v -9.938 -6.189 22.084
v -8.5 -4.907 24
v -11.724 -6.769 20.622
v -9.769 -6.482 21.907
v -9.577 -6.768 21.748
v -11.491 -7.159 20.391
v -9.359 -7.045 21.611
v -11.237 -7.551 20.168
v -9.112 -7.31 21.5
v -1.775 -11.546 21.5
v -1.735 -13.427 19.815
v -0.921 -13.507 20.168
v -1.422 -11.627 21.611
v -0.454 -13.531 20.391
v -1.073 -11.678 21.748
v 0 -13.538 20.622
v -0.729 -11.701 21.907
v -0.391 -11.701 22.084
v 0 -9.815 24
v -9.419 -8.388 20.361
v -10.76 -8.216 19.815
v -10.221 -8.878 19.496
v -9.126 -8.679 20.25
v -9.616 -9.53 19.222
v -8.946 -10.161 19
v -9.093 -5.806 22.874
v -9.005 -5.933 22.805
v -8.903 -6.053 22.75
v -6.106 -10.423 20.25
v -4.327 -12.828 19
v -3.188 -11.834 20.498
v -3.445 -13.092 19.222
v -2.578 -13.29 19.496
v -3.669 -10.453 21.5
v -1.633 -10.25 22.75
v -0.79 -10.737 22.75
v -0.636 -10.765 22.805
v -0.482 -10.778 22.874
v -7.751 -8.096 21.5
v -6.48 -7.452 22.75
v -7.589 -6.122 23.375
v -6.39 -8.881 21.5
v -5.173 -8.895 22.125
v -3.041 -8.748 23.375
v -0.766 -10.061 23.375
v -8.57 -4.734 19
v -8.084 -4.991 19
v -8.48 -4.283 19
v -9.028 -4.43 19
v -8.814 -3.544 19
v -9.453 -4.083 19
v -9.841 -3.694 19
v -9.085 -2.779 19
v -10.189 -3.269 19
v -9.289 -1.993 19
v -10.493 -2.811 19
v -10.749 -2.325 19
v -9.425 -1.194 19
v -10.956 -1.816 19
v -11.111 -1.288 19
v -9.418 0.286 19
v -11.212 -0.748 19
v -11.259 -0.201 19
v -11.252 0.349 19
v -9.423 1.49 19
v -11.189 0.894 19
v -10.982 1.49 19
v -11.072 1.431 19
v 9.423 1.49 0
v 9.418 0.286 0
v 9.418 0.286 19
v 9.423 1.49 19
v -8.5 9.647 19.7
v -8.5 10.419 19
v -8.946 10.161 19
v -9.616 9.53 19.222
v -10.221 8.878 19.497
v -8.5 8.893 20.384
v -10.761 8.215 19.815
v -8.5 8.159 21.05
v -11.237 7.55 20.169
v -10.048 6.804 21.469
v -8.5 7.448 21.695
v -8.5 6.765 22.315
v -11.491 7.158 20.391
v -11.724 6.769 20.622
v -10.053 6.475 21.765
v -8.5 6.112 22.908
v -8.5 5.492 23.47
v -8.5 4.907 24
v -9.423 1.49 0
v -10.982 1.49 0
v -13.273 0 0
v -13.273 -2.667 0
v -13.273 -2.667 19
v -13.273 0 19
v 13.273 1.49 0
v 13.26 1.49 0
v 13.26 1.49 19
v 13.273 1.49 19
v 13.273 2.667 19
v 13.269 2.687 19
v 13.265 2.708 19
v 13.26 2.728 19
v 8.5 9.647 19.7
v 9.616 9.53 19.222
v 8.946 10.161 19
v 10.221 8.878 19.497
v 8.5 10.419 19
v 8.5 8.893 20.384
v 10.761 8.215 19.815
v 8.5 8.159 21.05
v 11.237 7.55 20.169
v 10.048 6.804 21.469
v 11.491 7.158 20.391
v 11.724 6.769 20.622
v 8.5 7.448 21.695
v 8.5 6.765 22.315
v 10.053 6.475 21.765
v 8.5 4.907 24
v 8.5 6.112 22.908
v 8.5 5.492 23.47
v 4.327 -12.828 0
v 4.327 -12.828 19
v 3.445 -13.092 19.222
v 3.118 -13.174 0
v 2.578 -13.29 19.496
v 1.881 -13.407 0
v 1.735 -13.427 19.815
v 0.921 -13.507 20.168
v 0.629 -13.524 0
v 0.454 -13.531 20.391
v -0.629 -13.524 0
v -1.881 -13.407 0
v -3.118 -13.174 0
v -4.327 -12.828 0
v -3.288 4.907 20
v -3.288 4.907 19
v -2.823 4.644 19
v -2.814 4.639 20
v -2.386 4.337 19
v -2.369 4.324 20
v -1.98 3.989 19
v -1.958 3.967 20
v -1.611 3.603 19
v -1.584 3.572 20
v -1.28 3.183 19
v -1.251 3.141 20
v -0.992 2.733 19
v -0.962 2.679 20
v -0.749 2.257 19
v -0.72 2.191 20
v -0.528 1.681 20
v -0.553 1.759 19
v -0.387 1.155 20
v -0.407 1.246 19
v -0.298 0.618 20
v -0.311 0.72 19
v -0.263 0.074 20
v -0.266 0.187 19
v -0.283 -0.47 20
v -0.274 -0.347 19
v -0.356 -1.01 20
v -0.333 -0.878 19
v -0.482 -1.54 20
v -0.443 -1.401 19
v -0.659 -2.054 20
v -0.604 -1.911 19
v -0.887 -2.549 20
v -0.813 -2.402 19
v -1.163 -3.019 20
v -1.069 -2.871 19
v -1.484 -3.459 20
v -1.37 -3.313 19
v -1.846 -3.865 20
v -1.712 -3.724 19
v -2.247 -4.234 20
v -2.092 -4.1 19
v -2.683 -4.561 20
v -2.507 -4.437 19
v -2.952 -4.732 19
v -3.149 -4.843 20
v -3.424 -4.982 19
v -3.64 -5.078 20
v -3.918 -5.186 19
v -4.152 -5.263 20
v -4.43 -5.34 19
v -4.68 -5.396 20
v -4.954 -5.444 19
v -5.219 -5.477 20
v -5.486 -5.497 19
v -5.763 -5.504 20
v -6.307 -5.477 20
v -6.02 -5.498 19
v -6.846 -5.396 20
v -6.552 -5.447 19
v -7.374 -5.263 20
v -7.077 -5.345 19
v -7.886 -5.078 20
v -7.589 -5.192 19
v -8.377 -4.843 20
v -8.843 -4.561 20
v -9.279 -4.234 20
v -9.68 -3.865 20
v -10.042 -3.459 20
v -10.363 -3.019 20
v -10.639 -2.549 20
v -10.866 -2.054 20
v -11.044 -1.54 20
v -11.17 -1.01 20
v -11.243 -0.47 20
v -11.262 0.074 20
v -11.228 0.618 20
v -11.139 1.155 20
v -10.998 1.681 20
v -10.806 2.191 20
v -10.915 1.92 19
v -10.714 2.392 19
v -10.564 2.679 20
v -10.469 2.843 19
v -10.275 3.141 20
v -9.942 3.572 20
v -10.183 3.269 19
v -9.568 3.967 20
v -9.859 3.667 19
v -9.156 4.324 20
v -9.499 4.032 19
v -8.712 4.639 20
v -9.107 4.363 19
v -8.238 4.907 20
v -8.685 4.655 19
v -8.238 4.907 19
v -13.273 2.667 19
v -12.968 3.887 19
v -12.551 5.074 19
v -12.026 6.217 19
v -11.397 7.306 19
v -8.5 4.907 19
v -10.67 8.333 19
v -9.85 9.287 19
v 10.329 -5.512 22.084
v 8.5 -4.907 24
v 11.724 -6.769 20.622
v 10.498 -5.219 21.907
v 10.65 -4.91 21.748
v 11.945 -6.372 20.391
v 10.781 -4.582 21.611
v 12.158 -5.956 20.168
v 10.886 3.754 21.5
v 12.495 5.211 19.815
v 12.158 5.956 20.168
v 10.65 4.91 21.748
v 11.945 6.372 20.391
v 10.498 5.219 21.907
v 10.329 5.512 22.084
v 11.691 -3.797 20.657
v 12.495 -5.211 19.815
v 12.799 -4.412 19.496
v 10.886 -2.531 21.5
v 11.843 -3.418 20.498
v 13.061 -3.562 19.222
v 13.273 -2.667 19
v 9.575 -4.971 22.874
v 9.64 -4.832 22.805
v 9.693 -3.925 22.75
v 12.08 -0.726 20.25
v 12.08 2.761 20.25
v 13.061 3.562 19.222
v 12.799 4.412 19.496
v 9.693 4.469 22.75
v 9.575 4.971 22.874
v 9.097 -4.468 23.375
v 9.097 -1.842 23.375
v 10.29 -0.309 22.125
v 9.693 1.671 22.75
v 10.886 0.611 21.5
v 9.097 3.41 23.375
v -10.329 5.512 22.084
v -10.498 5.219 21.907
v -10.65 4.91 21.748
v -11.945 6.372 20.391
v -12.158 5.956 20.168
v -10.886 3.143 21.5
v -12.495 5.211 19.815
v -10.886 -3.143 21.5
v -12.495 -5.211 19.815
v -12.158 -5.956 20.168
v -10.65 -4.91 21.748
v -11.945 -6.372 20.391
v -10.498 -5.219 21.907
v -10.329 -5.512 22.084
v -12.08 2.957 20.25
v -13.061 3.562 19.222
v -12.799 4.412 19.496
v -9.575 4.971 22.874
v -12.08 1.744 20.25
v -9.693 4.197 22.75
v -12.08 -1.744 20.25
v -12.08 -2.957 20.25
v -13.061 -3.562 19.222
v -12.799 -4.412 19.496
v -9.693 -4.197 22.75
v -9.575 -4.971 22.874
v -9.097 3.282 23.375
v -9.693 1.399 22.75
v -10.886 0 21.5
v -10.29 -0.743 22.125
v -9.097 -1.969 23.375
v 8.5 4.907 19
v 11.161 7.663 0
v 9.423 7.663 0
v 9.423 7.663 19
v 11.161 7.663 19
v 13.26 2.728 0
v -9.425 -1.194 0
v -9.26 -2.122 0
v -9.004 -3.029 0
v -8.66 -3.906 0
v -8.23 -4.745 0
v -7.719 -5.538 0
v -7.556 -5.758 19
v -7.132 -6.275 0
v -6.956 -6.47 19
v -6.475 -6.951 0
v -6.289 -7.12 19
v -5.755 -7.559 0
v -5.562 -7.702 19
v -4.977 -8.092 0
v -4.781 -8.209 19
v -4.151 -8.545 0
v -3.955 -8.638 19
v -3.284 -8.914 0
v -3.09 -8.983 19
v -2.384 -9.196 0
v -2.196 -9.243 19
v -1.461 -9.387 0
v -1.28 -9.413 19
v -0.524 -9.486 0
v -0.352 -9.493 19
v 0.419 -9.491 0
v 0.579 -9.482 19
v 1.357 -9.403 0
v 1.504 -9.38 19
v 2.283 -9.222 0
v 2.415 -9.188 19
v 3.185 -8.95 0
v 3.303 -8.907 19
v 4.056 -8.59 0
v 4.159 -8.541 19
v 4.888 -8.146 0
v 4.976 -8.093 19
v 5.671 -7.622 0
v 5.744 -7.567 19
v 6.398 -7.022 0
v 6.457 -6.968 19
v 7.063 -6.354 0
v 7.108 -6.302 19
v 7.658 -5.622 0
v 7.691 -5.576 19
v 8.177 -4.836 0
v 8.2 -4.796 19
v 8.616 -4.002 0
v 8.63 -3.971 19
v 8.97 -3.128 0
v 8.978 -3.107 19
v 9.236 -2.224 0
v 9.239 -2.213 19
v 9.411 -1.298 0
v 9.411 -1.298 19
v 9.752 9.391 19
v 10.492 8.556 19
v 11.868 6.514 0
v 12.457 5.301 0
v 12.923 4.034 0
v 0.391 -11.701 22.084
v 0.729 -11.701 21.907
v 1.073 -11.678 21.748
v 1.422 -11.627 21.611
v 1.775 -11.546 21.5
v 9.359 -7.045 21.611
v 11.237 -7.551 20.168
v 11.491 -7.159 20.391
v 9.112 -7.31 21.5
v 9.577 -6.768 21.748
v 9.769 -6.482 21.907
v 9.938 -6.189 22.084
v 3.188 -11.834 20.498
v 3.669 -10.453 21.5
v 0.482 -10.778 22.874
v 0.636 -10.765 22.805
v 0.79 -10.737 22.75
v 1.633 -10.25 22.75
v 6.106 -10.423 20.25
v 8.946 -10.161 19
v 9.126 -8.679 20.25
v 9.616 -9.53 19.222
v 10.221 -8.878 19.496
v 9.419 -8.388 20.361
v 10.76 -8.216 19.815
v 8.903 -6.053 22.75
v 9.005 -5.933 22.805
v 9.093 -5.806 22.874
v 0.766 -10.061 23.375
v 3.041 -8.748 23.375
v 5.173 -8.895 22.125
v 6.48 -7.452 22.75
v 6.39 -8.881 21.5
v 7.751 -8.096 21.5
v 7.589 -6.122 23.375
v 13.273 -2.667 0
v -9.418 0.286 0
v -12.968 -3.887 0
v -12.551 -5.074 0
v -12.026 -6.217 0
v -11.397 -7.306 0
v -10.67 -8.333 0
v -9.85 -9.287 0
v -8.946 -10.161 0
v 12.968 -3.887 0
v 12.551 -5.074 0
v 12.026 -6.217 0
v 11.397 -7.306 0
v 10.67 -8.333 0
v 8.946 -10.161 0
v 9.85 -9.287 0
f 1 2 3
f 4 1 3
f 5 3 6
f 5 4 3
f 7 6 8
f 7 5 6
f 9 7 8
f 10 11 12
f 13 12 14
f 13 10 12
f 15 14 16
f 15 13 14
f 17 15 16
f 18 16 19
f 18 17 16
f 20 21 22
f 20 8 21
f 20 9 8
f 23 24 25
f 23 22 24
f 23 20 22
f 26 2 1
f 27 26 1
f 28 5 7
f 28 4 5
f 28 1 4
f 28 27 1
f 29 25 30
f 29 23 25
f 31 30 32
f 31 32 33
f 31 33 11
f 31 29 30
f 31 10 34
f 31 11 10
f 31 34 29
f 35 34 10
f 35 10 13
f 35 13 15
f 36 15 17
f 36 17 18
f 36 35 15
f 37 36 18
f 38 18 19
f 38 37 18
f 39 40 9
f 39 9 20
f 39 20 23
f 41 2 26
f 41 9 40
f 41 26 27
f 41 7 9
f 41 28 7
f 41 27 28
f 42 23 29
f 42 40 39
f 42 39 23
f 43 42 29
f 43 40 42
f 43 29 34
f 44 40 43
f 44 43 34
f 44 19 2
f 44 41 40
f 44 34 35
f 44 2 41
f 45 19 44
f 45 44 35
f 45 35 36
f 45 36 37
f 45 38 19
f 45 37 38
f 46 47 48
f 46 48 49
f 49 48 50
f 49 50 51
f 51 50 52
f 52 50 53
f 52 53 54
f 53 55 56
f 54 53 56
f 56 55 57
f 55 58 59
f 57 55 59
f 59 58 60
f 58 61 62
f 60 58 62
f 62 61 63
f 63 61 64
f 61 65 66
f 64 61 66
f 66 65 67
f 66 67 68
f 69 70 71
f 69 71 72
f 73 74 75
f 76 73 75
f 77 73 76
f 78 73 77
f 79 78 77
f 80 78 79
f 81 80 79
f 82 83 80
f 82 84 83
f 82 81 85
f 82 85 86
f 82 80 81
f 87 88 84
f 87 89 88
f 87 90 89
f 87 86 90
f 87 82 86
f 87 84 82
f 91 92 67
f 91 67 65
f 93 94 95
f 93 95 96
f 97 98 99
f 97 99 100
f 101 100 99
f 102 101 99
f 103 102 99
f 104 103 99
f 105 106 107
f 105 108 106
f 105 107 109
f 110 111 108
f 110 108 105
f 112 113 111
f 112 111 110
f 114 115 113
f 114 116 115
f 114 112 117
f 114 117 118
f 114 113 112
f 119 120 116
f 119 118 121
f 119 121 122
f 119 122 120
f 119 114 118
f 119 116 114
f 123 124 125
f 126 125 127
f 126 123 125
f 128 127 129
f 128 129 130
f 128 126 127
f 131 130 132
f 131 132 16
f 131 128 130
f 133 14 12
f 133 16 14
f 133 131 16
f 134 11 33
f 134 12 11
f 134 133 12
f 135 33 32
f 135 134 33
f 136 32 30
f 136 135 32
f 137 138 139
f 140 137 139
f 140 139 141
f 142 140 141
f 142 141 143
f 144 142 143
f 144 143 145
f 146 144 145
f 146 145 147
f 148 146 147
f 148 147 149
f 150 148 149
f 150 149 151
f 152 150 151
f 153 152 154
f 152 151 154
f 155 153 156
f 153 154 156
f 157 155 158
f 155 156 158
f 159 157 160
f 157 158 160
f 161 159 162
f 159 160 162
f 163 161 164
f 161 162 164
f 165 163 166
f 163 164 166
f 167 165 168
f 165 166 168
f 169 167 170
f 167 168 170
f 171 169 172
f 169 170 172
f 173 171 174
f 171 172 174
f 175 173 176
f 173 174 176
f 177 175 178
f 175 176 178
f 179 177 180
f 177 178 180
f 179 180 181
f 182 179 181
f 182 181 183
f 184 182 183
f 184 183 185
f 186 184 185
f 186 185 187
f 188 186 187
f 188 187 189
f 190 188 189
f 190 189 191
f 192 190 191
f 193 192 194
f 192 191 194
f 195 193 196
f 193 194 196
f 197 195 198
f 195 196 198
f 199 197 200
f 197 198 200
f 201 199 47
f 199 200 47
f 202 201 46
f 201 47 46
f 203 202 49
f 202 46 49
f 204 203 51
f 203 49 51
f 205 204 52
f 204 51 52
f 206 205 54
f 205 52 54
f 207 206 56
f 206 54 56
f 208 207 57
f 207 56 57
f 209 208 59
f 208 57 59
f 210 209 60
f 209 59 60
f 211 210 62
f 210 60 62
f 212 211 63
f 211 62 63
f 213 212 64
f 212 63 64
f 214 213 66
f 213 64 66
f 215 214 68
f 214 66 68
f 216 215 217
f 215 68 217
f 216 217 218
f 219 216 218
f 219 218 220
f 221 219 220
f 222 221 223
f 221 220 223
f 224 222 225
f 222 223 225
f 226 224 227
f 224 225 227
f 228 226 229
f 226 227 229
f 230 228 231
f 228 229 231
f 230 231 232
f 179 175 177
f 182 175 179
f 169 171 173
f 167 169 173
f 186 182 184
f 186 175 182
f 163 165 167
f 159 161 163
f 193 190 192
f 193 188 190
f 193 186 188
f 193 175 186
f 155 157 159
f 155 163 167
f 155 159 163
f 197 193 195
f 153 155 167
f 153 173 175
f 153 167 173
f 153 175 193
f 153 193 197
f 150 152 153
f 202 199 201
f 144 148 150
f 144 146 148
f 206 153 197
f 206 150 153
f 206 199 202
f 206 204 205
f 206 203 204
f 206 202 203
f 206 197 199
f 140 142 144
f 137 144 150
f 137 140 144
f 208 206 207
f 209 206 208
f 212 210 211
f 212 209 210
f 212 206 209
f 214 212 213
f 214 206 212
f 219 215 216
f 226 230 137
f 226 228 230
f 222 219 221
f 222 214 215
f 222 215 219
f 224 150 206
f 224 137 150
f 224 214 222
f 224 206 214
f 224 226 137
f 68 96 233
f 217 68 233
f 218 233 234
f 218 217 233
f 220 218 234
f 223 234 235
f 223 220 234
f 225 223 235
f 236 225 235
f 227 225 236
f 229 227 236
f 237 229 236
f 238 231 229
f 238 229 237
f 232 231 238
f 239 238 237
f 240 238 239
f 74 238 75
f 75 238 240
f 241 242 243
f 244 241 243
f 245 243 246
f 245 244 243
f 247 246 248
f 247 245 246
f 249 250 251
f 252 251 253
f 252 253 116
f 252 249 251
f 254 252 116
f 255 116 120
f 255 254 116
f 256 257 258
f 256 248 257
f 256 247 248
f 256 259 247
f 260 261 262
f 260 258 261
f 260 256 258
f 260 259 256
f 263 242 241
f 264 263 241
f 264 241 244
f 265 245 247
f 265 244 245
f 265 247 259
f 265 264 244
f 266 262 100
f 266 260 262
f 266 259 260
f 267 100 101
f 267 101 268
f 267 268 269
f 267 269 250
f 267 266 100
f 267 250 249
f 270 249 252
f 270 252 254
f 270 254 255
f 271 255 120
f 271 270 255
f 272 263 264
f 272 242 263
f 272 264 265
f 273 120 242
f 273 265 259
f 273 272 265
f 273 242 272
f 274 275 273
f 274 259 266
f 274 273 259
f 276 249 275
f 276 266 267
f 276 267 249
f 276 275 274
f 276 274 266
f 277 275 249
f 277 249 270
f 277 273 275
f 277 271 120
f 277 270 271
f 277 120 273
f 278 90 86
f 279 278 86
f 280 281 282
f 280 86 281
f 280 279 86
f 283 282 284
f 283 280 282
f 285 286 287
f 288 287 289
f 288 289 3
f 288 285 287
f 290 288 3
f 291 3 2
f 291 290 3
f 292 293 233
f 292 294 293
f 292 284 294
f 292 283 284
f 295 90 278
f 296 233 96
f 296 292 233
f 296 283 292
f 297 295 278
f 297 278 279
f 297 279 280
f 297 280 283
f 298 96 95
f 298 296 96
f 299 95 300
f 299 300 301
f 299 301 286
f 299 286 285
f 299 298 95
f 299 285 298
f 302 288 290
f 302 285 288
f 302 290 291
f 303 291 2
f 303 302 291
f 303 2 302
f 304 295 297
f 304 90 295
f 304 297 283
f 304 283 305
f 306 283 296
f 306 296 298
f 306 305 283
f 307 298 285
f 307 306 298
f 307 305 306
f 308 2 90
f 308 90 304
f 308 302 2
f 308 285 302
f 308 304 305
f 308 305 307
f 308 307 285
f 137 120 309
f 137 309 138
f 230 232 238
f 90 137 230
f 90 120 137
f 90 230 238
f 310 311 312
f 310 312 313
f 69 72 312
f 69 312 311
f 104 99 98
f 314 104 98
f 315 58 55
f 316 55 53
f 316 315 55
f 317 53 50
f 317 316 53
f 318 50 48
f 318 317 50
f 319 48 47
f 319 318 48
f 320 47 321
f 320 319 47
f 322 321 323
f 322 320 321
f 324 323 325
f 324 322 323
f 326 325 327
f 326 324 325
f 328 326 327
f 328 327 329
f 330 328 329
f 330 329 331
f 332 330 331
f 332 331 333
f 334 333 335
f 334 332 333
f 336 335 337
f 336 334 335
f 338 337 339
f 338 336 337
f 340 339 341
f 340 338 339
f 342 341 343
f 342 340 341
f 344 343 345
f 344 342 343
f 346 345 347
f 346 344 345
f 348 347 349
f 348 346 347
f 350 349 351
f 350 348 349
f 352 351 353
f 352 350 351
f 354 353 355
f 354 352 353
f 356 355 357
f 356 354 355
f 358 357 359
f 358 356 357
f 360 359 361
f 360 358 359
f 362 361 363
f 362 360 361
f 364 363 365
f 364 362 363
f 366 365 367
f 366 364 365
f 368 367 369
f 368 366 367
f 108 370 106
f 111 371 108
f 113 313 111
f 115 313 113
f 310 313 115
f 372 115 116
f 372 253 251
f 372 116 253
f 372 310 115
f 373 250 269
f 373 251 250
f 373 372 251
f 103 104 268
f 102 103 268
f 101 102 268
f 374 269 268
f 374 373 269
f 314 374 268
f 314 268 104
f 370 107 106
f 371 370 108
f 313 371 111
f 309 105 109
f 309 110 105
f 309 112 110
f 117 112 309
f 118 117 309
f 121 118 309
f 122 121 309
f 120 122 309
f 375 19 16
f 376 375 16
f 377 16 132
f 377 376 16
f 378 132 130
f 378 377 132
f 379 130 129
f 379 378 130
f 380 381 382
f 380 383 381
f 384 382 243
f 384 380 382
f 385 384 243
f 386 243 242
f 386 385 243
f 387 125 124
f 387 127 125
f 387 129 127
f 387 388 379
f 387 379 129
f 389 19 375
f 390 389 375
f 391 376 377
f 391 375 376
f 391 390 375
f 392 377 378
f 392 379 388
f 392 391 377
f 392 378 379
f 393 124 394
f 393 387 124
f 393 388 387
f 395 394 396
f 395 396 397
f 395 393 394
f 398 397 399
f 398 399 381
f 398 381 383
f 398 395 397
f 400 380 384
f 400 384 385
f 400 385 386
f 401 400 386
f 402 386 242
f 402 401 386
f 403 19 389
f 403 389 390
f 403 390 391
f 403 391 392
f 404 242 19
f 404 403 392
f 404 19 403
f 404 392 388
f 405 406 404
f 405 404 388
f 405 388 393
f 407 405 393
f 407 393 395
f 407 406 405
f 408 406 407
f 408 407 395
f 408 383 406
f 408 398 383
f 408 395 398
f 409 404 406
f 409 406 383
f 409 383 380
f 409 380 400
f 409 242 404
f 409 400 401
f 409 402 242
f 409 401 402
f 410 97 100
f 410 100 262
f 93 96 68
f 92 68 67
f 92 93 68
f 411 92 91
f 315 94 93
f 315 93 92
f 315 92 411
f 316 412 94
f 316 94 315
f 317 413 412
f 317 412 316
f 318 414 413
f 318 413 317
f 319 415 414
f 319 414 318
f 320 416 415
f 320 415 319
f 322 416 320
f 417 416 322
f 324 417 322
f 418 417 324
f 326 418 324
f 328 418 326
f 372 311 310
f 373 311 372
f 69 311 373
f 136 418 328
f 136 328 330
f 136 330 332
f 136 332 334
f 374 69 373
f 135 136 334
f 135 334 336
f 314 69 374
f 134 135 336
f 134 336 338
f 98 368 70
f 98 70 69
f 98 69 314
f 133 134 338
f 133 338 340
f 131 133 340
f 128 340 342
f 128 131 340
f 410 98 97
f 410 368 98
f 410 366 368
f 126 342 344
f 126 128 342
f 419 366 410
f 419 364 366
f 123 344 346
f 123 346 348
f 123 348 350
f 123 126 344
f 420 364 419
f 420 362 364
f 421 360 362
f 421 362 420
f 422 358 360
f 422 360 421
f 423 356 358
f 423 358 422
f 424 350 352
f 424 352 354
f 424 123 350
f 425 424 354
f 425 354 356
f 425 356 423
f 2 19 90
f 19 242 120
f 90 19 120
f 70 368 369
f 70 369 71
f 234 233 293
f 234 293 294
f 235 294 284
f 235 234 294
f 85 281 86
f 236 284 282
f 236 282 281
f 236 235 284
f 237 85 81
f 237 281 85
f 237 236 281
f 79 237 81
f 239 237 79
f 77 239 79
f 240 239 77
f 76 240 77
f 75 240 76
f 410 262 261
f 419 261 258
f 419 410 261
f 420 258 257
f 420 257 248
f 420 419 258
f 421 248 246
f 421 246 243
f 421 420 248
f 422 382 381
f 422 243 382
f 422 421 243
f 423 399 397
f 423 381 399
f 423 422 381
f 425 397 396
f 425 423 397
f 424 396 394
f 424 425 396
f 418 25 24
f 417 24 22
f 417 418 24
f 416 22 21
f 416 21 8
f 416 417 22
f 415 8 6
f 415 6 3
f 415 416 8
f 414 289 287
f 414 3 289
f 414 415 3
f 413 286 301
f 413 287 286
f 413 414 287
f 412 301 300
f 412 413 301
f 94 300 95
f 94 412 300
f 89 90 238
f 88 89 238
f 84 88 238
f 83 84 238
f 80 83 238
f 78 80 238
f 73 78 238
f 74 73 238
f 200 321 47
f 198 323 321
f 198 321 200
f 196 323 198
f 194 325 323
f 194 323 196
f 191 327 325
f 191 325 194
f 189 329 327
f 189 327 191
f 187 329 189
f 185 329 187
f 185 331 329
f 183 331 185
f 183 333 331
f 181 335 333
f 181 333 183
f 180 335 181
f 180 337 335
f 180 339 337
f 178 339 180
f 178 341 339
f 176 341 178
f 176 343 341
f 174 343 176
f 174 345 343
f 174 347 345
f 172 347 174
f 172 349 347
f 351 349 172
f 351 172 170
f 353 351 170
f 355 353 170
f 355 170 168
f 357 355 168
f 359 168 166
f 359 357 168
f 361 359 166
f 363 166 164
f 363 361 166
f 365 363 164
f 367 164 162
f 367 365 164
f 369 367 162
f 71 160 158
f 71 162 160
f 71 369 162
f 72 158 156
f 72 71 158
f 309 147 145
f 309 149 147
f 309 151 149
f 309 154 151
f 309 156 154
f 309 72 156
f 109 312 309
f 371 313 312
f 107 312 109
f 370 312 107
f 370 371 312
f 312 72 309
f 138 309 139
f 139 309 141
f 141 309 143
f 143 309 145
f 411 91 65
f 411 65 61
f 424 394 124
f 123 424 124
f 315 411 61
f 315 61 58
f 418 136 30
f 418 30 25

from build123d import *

# Parameters (mm, degrees)
BOSS_EXTRUDE1_DEPTH = 19
CUT_EXTRUDE1_DEPTH  = 5
SKETCH5_R           = 5.5
CUT_EXTRUDE2_DEPTH  = 1
SKETCH6_W           = 3.836976741
SKETCH6_H           = 19
BOSS_EXTRUDE2_DEPTH = 6.17281
CUT_EXTRUDE3_DEPTH  = 19
SKETCH8_R           = 15.326273961
SKETCH8_R_2         = 13.53815969
CUT_EXTRUDE4_DEPTH  = 20
CUT_EXTRUDE5_START  = -20
SKETCH9_R           = 15.315451293
SKETCH9_R_2         = 13.53815969
CUT_EXTRUDE5_DEPTH  = 20


with BuildPart() as part:
    # Sketch1 → Boss-Extrude1 (new body)
    with BuildSketch(Plane.XY):
        with BuildLine():
            Line((9.418070486, 0.286487124), (9.423467442, 1.490329505))
            Line((9.423467442, 1.490329505), (13.272942596, 1.490329505))
            Line((13.272942596, 1.490329505), (13.272942596, -7.663136981))
            Line((13.272942596, -7.663136981), (0, -15.326273961))
            Line((0, -15.326273961), (-13.272942596, -7.663136981))
            Line((-13.272942596, -7.663136981), (-13.272942596, 0))
            Line((-13.272942596, 0), (-10.981676699, 1.490329505))
            Line((-10.981676699, 1.490329505), (-9.423467442, 1.490329505))
            Line((-9.423467442, 1.490329505), (-9.418070486, 0.286487124))
            Line((-9.418070486, 0.286487124), (-9.42470631, -1.19369635))
            ThreePointArc((-9.42470631, -1.19369635), (-0.052384082, -9.499855573), (9.41096903, -1.297559989))
            Line((9.41096903, -1.297559989), (9.418070486, 0.286487124))
        make_face()
    extrude(amount=BOSS_EXTRUDE1_DEPTH)

    # Sketch2 → Loft1 section 0
    with BuildSketch(Plane.XY.offset(19)):
        with BuildLine():
            Line((0, -15.326273961), (13.272942596, -7.663136981))
            Line((13.272942596, -7.663136981), (13.272942596, 7.663136981))
            Line((13.272942596, 7.663136981), (0, 15.326273961))
            Line((0, 15.326273961), (-13.272942596, 7.663136981))
            Line((-13.272942596, 7.663136981), (-13.272942596, -7.663136981))
            Line((-13.272942596, -7.663136981), (0, -15.326273961))
        make_face()
    # Sketch3 → Loft1 section 1
    with BuildSketch(Plane.XY.offset(24)):
        with BuildLine():
            Line((0, -9.814954576), (8.5, -4.907477288))
            Line((8.5, -4.907477288), (8.5, 4.907477288))
            Line((8.5, 4.907477288), (0, 9.814954576))
            Line((0, 9.814954576), (-8.5, 4.907477288))
            Line((-8.5, 4.907477288), (-8.5, -4.907477288))
            Line((-8.5, -4.907477288), (0, -9.814954576))
        make_face()
    loft()

    # Sketch4 → Cut-Extrude1 (cut)
    with BuildSketch(Plane.XY.offset(24)):
        Polygon((-8.5, 4.907477288), (-8.5, 10.418796673), (0, 15.326273961), (8.5, 10.418796673), (8.5, 4.907477288), align=None)
    extrude(amount=-CUT_EXTRUDE1_DEPTH, mode=Mode.SUBTRACT)

    # Sketch5 → Cut-Extrude2 (cut)
    with BuildSketch(Plane(origin=(0, 0, 19), x_dir=(-1, 0, 0), z_dir=(0, 0, -1))):
        with Locations((5.762922136, -0.004092629)):
            Circle(SKETCH5_R)
    extrude(amount=-CUT_EXTRUDE2_DEPTH, mode=Mode.SUBTRACT)

    # Sketch6 → Boss-Extrude2 (add)
    with BuildSketch(Plane(origin=(0, 1.490329505, 0), x_dir=(1, 0, 0), z_dir=(0, 1, 0))):
        with Locations((11.341955813, -9.5)):
            Rectangle(SKETCH6_W, SKETCH6_H)
    extrude(amount=BOSS_EXTRUDE2_DEPTH)

    # Sketch7 → Cut-Extrude3 (cut)
    with BuildSketch(Plane(origin=(0, 0, 0), x_dir=(-1, 0, 0), z_dir=(0, 0, -1))):
        with BuildLine():
            Line((13.53815969, 0), (15.326273961, 0))
            ThreePointArc((15.326273961, 0), (0, -15.326273961), (-15.326273961, 0))
            Line((-15.326273961, 0), (-13.53815969, 0))
            ThreePointArc((-13.53815969, 0), (0, -13.53815969), (13.53815969, 0))
        make_face()
    extrude(amount=-CUT_EXTRUDE3_DEPTH, mode=Mode.SUBTRACT)

    # Sketch8 → Cut-Extrude4 (cut)
    with BuildSketch(Plane(origin=(0, 0, 19), x_dir=(-1, 0, 0), z_dir=(0, 0, -1))):
        Circle(SKETCH8_R)
        Circle(SKETCH8_R_2, mode=Mode.SUBTRACT)
    extrude(amount=-CUT_EXTRUDE4_DEPTH, mode=Mode.SUBTRACT)

    # Sketch9 → Cut-Extrude5 (cut)
    with BuildSketch(Plane.XY.offset(19).offset(CUT_EXTRUDE5_START)):
        Circle(SKETCH9_R)
        Circle(SKETCH9_R_2, mode=Mode.SUBTRACT)
    extrude(amount=CUT_EXTRUDE5_DEPTH, mode=Mode.SUBTRACT)


with BuildPart() as cut_extrude5_kept_piece:
    # of the separate pieces the step leaves, the one the design keeps (cut_extrude5_pieces_kept)
    add(part.part.solids().sort_by_distance((9.41096903, -1.297559989, 0))[0])


solid = cut_extrude5_kept_piece.part
